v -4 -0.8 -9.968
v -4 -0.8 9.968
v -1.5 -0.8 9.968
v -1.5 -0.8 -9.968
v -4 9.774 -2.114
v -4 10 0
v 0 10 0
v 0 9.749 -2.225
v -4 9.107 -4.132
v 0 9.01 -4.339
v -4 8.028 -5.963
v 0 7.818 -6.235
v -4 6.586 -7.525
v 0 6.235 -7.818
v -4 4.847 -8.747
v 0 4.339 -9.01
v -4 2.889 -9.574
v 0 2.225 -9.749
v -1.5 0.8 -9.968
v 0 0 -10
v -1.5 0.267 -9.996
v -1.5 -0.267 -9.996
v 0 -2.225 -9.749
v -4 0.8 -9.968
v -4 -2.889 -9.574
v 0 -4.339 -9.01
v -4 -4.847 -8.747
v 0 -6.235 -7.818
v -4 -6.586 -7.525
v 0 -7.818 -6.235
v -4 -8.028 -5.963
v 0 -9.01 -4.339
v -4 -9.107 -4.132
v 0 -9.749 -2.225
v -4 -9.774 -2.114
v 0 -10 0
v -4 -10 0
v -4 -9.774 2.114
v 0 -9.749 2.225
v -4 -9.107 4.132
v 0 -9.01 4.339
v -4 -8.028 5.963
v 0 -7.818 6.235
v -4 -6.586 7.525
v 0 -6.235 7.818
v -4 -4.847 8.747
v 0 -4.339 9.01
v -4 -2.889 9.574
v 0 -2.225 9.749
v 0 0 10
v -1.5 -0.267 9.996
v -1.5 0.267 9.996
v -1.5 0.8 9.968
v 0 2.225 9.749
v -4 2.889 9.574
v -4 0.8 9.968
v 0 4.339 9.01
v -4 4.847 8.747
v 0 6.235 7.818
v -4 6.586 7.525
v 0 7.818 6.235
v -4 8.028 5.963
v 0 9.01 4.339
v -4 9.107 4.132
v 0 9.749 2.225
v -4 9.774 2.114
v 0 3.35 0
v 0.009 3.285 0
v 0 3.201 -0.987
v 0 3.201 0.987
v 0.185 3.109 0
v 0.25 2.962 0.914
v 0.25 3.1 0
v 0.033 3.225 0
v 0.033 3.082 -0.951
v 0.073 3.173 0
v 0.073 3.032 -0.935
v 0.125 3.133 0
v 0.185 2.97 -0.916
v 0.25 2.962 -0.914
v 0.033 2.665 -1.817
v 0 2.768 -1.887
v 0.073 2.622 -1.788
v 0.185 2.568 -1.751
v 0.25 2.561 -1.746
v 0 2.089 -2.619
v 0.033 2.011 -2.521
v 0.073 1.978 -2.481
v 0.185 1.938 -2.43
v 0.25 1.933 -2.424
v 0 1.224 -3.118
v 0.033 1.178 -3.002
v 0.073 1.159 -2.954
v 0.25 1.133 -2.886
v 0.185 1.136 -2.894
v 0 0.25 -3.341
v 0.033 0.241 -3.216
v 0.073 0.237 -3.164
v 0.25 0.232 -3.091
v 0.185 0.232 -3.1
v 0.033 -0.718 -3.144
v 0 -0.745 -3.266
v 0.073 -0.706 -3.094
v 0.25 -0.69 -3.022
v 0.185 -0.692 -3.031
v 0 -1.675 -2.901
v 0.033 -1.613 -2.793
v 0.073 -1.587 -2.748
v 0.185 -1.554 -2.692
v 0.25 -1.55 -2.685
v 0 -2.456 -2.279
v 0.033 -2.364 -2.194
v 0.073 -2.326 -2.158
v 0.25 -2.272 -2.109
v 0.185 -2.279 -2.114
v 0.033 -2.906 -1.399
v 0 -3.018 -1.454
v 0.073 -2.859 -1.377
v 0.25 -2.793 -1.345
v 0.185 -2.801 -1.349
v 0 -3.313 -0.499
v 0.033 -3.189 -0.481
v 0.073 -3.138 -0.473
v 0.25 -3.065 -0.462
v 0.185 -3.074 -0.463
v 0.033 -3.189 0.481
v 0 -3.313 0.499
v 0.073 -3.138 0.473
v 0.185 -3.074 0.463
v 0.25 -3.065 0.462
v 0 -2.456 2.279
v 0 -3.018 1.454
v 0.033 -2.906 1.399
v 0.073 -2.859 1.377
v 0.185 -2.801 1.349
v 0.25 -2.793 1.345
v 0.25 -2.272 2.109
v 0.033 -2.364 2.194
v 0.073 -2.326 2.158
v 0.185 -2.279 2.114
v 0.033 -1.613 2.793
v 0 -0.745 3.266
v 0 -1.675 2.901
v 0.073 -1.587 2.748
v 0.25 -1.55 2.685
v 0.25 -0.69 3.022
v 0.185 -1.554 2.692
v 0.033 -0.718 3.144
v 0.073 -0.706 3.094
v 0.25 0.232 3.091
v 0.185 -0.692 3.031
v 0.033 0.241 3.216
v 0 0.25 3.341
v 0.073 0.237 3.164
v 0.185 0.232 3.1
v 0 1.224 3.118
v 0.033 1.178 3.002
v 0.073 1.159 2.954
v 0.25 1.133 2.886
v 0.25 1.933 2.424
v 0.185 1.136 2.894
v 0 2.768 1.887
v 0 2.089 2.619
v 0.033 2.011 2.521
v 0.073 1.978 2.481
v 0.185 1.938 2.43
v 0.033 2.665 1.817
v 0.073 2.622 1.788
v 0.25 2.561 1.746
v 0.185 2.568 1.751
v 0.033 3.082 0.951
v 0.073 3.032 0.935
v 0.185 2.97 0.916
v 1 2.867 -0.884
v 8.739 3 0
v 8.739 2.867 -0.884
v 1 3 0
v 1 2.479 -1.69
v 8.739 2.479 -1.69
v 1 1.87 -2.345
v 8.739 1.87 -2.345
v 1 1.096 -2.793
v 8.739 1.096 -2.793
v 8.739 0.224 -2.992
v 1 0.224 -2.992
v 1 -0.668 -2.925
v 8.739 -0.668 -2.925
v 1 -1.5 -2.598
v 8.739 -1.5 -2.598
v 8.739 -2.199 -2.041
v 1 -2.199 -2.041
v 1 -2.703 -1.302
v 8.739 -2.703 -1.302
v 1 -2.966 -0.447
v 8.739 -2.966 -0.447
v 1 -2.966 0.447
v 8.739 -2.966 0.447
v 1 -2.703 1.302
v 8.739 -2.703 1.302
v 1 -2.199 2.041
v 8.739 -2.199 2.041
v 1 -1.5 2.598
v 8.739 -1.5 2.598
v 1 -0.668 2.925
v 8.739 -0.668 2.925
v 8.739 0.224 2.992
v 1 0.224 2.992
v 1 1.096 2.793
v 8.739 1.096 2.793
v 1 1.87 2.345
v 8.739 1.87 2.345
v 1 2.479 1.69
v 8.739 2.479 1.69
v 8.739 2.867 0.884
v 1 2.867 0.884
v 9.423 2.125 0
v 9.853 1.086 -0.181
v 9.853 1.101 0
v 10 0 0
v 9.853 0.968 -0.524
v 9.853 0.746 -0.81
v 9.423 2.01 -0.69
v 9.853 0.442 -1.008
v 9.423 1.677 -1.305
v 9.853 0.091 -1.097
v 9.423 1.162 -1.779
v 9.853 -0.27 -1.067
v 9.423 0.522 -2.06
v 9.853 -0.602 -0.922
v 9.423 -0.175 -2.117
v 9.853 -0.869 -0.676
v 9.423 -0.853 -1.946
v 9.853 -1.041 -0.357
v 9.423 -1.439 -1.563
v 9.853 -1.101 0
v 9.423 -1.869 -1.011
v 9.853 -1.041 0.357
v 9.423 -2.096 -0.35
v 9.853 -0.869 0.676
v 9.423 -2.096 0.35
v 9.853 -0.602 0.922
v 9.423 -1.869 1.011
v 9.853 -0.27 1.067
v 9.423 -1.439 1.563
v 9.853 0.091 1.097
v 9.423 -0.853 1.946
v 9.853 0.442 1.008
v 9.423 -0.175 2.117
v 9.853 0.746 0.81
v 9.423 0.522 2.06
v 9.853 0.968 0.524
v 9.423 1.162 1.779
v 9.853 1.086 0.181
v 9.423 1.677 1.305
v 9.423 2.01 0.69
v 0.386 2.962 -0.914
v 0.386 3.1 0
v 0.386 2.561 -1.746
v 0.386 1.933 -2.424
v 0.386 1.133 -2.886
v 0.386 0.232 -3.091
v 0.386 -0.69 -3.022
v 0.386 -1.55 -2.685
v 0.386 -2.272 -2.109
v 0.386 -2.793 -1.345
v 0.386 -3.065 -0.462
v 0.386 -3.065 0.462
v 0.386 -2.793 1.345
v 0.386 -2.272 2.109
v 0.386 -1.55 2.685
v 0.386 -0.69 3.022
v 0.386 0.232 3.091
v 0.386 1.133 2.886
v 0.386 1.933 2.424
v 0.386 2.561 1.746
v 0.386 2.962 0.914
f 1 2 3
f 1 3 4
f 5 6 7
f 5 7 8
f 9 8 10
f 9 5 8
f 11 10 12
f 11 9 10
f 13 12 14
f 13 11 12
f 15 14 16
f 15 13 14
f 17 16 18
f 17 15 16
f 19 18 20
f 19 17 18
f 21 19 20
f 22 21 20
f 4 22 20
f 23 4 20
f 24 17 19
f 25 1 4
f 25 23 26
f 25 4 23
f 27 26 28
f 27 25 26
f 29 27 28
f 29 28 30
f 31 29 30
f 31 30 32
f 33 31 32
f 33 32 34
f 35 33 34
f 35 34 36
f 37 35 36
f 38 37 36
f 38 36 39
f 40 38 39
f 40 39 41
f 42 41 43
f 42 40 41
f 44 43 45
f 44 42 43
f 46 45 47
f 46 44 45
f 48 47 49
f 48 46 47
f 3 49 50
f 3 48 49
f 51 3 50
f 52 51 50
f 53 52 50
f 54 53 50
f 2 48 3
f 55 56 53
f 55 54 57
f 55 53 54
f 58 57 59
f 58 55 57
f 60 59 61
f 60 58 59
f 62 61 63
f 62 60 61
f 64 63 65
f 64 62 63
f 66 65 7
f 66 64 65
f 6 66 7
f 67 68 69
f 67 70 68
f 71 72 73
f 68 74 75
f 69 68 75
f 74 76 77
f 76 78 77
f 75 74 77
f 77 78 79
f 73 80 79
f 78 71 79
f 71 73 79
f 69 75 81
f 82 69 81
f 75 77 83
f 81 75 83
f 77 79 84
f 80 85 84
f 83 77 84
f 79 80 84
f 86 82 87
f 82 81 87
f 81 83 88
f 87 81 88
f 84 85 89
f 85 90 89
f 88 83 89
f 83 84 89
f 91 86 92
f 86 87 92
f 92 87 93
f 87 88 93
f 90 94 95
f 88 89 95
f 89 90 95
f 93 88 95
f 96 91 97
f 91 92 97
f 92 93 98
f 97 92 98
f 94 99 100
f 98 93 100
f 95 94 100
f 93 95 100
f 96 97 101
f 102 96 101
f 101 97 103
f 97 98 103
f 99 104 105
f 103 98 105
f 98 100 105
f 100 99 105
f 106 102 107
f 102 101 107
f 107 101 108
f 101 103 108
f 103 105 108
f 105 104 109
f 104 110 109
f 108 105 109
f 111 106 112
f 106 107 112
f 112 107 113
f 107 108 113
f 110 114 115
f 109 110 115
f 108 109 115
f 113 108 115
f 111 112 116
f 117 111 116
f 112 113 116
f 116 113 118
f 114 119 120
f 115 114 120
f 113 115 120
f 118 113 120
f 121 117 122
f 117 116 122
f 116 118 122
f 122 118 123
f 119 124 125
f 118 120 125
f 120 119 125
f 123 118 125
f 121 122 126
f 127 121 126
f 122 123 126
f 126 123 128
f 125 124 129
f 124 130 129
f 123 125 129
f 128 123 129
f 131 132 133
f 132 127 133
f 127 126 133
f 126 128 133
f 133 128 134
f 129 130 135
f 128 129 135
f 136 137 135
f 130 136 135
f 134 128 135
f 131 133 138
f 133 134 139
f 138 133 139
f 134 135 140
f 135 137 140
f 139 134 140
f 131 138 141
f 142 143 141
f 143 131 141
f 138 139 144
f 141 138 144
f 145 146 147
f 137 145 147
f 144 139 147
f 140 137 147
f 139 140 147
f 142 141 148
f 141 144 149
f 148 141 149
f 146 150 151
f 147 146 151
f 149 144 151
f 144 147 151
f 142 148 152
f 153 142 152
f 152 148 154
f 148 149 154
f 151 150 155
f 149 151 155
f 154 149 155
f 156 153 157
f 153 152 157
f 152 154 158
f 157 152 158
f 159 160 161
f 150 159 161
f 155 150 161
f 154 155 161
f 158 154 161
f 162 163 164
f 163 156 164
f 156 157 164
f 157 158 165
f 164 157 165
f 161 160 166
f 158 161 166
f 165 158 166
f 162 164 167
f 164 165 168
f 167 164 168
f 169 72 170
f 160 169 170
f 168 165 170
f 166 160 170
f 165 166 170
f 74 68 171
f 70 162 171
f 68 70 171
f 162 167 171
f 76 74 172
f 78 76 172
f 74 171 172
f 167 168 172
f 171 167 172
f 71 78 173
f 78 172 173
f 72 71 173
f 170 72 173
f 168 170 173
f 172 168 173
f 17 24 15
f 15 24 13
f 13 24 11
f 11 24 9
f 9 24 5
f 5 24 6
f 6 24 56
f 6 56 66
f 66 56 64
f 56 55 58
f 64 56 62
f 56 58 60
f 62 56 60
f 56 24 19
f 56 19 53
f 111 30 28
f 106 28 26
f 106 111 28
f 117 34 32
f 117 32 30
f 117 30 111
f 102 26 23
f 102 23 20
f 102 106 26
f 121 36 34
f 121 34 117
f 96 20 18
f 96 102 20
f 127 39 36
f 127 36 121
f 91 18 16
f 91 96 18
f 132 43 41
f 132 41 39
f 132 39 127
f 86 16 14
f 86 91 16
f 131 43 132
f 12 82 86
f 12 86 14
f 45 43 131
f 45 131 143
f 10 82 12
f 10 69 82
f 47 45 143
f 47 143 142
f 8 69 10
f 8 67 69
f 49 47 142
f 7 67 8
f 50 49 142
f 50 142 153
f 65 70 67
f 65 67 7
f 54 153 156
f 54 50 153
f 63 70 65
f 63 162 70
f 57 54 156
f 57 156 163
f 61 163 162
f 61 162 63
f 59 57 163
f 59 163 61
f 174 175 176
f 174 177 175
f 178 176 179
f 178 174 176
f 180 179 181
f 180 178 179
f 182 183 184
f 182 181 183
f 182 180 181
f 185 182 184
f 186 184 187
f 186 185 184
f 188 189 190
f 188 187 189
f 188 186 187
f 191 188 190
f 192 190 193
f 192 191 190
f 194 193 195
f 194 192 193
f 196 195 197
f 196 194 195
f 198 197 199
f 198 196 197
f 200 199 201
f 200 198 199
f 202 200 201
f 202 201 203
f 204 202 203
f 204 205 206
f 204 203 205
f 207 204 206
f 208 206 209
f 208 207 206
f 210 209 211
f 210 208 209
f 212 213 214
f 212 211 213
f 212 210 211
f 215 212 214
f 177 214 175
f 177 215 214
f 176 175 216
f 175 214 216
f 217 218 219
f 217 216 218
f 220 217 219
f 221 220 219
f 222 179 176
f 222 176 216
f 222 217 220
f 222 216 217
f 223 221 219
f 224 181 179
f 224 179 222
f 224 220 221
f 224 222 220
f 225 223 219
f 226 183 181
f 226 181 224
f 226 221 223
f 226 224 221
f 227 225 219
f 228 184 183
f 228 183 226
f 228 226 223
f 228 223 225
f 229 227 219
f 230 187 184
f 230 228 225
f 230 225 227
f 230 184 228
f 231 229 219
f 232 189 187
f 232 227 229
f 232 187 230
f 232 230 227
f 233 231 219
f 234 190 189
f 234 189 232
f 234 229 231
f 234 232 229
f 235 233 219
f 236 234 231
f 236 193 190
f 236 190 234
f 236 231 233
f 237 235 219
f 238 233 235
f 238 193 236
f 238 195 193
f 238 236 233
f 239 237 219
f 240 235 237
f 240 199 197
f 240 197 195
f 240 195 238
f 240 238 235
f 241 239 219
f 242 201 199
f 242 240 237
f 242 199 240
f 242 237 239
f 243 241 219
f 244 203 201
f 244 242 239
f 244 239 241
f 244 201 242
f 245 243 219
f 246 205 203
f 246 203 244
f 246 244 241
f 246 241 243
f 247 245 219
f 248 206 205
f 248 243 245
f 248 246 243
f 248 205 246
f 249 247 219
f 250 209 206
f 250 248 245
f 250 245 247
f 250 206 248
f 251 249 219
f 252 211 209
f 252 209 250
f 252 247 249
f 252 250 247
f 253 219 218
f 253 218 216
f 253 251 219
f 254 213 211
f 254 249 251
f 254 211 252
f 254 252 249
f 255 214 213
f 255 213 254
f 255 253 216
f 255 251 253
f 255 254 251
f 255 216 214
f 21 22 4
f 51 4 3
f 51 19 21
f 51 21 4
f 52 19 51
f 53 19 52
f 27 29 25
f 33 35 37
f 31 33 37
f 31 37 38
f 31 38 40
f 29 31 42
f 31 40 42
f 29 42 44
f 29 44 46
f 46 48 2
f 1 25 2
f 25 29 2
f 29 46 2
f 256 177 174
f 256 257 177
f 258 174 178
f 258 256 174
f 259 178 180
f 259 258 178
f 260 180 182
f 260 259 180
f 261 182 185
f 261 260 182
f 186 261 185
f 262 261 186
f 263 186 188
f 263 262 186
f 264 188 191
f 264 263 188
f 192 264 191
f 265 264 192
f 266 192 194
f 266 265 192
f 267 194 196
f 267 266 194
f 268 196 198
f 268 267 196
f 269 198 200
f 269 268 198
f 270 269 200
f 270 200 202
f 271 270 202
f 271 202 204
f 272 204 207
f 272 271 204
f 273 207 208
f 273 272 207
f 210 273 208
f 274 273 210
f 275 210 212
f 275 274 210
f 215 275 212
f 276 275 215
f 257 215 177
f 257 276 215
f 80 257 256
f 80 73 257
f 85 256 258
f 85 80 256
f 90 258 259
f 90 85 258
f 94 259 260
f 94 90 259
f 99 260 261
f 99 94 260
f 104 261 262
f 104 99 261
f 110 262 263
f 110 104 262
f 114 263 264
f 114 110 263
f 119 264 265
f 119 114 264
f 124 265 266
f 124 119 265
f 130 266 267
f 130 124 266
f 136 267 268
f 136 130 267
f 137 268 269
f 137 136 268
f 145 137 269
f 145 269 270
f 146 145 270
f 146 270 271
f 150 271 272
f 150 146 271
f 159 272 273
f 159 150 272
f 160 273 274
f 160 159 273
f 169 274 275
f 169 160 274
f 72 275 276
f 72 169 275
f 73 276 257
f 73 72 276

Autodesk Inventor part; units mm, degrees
ref_plane "YZ Plane" through (0, 0, 0) normal (1, 0, 0) x (0, 1, 0)
ref_plane "XZ Plane" through (0, 0, 0) normal (0, 1, 0) x (-1, 0, 0)
sketch "Sketch1" plane through (0, 0, 0) normal (0, 0, 1) x (1, 0, 0)
  line L0 (-4, 0) -> (10, 0)
  line L1 (10, 0) -> (10, 3)
  line L2 (10, 3) -> (1, 3)
  line L3 (1, 3) -> (0.3865, 3.1)
  line L4 (0.3865, 3.1) -> (0.25, 3.1)
  line L5 (0, 3.35) -> (0, 10)
  line L6 (-6.8, 0) -> (12.8, 0) projected
  line L7 (0, -2) -> (0, 12) projected
  line L8 (-4, 0) -> (-4, 9.9999)
  line L9 (0, 10) -> (-4, 9.9999)
  arc A0 (0, 3.35) -> (0.25, 3.1) centre (0.25, 3.35) ccw
  point P0 (0, 3.1)
  dimension "d0" = 10
  dimension "d1" = 9
  dimension "d2" = 0.6135
  dimension "d3" = 4
  dimension "d4" = 6
  dimension "d5" = 6.2
  dimension "d9" = 20
  dimension "d10" = 0.001
  dimension "d40" = 0.25
revolve "Body" add sketch "Sketch1" angle 360 about axis through (-4, 0, 0) along (1, 0, 0)
sketch "Sketch2" plane through (-4, 0, 0) normal (-1, 0, 0) x (0, 0, 1)
  circle A0 centre (0, 0) radius 10 projected
  line L0 (0, 0) -> (0, 9.9999) projected
  line L1 (-10, 0.8) -> (10, 0.8)
  line L2 (10, 0.8) -> (10, -0.8)
  line L3 (10, -0.8) -> (-10, -0.8)
  line L4 (-10, -0.8) -> (-10, 0.8)
  line L5 (-10, 0) -> (10, 0) construction
  line L6 (0, 0.8) -> (0, -0.8) construction
  dimension "d11" = 1.6
  dimension "d12" = 20
fillet "Fillet1" radius 0.0001 1 edges at (-4, -9.9999, 0)
extrude "Slot" cut sketch "Sketch2" against normal blind 2.5 contours A0 L3 L1 | L2 L3 A0 | A0 L1 L2 | L3 L4 A0 | A0 L4 L1
thread "Thread" size "M6x1" designation "M6" class "6g" standard "GB Metric profile" length 9
sketch "Sketch3" plane through (0, 0, 0) normal (0, 0, 1) x (1, 0, 0)
  line L0 (10, 0) -> (10, 3) projected
  line L1 (10, 3) -> (1, 3) projected
  line L2 (-4, 0) -> (10, 0) projected
  line L3 (10, -3) -> (10, 3) projected
  line L4 (1, -3) -> (10, -3) projected
  arc A0 (8.7394, -3) -> (8.7394, 3) centre (5.8, 0) ccw
  dimension "d41" = 8.4
revolve "Fillet2" cut sketch "Sketch3" angle 360 about axis through (-4, 0, 0) along (1, 0, 0) contours A0 L1 L0
ref_plane "Work Plane1" through (30.1625, 0, 0) normal (0, 0, -1) x (1, 0, 0)
equation "\"d11\" = SBR"
equation "\"d12\" = KOD"
equation "\"d13\" = RR"
equation "\"d16\" = STI"
equation "\"d14\" = GEL"
equation "\"d0\" = NLG"
equation "\"d1\" = GEL"
equation "\"d2\" = GAL"
equation "\"d3\" = KOH"
equation "\"d4\" = GD"
equation "\"d5\" = BDM"
equation "\"d9\" = KOD"
equation "\"d10\" = KEWI"
equation "\"d40\" = R"
equation "\"d41\" = RE"
equation "\"GD\" = NND"
equation "\"NLG\" = 10"
equation "\"GEL\" = 9"
equation "\"KOD\" = 20"
equation "\"KOH\" = 4"
equation "\"GAL\" = 0.61345 * PTC"
equation "\"BDM\" = 6.2"
equation "\"RR\" = 0.0001"
equation "\"SBR\" = 1.6"
equation "\"STI\" = 2.5"
equation "\"KEWI\" = 0.001deg"
equation "\"R\" = 0.25"
equation "\"RE\" = 8.4"
equation "\"GUL\" = 0.61345 * PTC"
equation "\"SPD\" = NND - 1.2269 * PTC"
equation "\"PTC\" = 1"
equation "\"THREADDIA\" = 6"
equation "\"TOA\" = 30deg"
equation "\"FAWI\" = 45"
equation "\"NND\" = 6"
equation "\"GD1\" = THREADDIA - 1.2269 * PTC"
properties part number "Screw GB 833 M6 x 10" material "Steel, Mild"
